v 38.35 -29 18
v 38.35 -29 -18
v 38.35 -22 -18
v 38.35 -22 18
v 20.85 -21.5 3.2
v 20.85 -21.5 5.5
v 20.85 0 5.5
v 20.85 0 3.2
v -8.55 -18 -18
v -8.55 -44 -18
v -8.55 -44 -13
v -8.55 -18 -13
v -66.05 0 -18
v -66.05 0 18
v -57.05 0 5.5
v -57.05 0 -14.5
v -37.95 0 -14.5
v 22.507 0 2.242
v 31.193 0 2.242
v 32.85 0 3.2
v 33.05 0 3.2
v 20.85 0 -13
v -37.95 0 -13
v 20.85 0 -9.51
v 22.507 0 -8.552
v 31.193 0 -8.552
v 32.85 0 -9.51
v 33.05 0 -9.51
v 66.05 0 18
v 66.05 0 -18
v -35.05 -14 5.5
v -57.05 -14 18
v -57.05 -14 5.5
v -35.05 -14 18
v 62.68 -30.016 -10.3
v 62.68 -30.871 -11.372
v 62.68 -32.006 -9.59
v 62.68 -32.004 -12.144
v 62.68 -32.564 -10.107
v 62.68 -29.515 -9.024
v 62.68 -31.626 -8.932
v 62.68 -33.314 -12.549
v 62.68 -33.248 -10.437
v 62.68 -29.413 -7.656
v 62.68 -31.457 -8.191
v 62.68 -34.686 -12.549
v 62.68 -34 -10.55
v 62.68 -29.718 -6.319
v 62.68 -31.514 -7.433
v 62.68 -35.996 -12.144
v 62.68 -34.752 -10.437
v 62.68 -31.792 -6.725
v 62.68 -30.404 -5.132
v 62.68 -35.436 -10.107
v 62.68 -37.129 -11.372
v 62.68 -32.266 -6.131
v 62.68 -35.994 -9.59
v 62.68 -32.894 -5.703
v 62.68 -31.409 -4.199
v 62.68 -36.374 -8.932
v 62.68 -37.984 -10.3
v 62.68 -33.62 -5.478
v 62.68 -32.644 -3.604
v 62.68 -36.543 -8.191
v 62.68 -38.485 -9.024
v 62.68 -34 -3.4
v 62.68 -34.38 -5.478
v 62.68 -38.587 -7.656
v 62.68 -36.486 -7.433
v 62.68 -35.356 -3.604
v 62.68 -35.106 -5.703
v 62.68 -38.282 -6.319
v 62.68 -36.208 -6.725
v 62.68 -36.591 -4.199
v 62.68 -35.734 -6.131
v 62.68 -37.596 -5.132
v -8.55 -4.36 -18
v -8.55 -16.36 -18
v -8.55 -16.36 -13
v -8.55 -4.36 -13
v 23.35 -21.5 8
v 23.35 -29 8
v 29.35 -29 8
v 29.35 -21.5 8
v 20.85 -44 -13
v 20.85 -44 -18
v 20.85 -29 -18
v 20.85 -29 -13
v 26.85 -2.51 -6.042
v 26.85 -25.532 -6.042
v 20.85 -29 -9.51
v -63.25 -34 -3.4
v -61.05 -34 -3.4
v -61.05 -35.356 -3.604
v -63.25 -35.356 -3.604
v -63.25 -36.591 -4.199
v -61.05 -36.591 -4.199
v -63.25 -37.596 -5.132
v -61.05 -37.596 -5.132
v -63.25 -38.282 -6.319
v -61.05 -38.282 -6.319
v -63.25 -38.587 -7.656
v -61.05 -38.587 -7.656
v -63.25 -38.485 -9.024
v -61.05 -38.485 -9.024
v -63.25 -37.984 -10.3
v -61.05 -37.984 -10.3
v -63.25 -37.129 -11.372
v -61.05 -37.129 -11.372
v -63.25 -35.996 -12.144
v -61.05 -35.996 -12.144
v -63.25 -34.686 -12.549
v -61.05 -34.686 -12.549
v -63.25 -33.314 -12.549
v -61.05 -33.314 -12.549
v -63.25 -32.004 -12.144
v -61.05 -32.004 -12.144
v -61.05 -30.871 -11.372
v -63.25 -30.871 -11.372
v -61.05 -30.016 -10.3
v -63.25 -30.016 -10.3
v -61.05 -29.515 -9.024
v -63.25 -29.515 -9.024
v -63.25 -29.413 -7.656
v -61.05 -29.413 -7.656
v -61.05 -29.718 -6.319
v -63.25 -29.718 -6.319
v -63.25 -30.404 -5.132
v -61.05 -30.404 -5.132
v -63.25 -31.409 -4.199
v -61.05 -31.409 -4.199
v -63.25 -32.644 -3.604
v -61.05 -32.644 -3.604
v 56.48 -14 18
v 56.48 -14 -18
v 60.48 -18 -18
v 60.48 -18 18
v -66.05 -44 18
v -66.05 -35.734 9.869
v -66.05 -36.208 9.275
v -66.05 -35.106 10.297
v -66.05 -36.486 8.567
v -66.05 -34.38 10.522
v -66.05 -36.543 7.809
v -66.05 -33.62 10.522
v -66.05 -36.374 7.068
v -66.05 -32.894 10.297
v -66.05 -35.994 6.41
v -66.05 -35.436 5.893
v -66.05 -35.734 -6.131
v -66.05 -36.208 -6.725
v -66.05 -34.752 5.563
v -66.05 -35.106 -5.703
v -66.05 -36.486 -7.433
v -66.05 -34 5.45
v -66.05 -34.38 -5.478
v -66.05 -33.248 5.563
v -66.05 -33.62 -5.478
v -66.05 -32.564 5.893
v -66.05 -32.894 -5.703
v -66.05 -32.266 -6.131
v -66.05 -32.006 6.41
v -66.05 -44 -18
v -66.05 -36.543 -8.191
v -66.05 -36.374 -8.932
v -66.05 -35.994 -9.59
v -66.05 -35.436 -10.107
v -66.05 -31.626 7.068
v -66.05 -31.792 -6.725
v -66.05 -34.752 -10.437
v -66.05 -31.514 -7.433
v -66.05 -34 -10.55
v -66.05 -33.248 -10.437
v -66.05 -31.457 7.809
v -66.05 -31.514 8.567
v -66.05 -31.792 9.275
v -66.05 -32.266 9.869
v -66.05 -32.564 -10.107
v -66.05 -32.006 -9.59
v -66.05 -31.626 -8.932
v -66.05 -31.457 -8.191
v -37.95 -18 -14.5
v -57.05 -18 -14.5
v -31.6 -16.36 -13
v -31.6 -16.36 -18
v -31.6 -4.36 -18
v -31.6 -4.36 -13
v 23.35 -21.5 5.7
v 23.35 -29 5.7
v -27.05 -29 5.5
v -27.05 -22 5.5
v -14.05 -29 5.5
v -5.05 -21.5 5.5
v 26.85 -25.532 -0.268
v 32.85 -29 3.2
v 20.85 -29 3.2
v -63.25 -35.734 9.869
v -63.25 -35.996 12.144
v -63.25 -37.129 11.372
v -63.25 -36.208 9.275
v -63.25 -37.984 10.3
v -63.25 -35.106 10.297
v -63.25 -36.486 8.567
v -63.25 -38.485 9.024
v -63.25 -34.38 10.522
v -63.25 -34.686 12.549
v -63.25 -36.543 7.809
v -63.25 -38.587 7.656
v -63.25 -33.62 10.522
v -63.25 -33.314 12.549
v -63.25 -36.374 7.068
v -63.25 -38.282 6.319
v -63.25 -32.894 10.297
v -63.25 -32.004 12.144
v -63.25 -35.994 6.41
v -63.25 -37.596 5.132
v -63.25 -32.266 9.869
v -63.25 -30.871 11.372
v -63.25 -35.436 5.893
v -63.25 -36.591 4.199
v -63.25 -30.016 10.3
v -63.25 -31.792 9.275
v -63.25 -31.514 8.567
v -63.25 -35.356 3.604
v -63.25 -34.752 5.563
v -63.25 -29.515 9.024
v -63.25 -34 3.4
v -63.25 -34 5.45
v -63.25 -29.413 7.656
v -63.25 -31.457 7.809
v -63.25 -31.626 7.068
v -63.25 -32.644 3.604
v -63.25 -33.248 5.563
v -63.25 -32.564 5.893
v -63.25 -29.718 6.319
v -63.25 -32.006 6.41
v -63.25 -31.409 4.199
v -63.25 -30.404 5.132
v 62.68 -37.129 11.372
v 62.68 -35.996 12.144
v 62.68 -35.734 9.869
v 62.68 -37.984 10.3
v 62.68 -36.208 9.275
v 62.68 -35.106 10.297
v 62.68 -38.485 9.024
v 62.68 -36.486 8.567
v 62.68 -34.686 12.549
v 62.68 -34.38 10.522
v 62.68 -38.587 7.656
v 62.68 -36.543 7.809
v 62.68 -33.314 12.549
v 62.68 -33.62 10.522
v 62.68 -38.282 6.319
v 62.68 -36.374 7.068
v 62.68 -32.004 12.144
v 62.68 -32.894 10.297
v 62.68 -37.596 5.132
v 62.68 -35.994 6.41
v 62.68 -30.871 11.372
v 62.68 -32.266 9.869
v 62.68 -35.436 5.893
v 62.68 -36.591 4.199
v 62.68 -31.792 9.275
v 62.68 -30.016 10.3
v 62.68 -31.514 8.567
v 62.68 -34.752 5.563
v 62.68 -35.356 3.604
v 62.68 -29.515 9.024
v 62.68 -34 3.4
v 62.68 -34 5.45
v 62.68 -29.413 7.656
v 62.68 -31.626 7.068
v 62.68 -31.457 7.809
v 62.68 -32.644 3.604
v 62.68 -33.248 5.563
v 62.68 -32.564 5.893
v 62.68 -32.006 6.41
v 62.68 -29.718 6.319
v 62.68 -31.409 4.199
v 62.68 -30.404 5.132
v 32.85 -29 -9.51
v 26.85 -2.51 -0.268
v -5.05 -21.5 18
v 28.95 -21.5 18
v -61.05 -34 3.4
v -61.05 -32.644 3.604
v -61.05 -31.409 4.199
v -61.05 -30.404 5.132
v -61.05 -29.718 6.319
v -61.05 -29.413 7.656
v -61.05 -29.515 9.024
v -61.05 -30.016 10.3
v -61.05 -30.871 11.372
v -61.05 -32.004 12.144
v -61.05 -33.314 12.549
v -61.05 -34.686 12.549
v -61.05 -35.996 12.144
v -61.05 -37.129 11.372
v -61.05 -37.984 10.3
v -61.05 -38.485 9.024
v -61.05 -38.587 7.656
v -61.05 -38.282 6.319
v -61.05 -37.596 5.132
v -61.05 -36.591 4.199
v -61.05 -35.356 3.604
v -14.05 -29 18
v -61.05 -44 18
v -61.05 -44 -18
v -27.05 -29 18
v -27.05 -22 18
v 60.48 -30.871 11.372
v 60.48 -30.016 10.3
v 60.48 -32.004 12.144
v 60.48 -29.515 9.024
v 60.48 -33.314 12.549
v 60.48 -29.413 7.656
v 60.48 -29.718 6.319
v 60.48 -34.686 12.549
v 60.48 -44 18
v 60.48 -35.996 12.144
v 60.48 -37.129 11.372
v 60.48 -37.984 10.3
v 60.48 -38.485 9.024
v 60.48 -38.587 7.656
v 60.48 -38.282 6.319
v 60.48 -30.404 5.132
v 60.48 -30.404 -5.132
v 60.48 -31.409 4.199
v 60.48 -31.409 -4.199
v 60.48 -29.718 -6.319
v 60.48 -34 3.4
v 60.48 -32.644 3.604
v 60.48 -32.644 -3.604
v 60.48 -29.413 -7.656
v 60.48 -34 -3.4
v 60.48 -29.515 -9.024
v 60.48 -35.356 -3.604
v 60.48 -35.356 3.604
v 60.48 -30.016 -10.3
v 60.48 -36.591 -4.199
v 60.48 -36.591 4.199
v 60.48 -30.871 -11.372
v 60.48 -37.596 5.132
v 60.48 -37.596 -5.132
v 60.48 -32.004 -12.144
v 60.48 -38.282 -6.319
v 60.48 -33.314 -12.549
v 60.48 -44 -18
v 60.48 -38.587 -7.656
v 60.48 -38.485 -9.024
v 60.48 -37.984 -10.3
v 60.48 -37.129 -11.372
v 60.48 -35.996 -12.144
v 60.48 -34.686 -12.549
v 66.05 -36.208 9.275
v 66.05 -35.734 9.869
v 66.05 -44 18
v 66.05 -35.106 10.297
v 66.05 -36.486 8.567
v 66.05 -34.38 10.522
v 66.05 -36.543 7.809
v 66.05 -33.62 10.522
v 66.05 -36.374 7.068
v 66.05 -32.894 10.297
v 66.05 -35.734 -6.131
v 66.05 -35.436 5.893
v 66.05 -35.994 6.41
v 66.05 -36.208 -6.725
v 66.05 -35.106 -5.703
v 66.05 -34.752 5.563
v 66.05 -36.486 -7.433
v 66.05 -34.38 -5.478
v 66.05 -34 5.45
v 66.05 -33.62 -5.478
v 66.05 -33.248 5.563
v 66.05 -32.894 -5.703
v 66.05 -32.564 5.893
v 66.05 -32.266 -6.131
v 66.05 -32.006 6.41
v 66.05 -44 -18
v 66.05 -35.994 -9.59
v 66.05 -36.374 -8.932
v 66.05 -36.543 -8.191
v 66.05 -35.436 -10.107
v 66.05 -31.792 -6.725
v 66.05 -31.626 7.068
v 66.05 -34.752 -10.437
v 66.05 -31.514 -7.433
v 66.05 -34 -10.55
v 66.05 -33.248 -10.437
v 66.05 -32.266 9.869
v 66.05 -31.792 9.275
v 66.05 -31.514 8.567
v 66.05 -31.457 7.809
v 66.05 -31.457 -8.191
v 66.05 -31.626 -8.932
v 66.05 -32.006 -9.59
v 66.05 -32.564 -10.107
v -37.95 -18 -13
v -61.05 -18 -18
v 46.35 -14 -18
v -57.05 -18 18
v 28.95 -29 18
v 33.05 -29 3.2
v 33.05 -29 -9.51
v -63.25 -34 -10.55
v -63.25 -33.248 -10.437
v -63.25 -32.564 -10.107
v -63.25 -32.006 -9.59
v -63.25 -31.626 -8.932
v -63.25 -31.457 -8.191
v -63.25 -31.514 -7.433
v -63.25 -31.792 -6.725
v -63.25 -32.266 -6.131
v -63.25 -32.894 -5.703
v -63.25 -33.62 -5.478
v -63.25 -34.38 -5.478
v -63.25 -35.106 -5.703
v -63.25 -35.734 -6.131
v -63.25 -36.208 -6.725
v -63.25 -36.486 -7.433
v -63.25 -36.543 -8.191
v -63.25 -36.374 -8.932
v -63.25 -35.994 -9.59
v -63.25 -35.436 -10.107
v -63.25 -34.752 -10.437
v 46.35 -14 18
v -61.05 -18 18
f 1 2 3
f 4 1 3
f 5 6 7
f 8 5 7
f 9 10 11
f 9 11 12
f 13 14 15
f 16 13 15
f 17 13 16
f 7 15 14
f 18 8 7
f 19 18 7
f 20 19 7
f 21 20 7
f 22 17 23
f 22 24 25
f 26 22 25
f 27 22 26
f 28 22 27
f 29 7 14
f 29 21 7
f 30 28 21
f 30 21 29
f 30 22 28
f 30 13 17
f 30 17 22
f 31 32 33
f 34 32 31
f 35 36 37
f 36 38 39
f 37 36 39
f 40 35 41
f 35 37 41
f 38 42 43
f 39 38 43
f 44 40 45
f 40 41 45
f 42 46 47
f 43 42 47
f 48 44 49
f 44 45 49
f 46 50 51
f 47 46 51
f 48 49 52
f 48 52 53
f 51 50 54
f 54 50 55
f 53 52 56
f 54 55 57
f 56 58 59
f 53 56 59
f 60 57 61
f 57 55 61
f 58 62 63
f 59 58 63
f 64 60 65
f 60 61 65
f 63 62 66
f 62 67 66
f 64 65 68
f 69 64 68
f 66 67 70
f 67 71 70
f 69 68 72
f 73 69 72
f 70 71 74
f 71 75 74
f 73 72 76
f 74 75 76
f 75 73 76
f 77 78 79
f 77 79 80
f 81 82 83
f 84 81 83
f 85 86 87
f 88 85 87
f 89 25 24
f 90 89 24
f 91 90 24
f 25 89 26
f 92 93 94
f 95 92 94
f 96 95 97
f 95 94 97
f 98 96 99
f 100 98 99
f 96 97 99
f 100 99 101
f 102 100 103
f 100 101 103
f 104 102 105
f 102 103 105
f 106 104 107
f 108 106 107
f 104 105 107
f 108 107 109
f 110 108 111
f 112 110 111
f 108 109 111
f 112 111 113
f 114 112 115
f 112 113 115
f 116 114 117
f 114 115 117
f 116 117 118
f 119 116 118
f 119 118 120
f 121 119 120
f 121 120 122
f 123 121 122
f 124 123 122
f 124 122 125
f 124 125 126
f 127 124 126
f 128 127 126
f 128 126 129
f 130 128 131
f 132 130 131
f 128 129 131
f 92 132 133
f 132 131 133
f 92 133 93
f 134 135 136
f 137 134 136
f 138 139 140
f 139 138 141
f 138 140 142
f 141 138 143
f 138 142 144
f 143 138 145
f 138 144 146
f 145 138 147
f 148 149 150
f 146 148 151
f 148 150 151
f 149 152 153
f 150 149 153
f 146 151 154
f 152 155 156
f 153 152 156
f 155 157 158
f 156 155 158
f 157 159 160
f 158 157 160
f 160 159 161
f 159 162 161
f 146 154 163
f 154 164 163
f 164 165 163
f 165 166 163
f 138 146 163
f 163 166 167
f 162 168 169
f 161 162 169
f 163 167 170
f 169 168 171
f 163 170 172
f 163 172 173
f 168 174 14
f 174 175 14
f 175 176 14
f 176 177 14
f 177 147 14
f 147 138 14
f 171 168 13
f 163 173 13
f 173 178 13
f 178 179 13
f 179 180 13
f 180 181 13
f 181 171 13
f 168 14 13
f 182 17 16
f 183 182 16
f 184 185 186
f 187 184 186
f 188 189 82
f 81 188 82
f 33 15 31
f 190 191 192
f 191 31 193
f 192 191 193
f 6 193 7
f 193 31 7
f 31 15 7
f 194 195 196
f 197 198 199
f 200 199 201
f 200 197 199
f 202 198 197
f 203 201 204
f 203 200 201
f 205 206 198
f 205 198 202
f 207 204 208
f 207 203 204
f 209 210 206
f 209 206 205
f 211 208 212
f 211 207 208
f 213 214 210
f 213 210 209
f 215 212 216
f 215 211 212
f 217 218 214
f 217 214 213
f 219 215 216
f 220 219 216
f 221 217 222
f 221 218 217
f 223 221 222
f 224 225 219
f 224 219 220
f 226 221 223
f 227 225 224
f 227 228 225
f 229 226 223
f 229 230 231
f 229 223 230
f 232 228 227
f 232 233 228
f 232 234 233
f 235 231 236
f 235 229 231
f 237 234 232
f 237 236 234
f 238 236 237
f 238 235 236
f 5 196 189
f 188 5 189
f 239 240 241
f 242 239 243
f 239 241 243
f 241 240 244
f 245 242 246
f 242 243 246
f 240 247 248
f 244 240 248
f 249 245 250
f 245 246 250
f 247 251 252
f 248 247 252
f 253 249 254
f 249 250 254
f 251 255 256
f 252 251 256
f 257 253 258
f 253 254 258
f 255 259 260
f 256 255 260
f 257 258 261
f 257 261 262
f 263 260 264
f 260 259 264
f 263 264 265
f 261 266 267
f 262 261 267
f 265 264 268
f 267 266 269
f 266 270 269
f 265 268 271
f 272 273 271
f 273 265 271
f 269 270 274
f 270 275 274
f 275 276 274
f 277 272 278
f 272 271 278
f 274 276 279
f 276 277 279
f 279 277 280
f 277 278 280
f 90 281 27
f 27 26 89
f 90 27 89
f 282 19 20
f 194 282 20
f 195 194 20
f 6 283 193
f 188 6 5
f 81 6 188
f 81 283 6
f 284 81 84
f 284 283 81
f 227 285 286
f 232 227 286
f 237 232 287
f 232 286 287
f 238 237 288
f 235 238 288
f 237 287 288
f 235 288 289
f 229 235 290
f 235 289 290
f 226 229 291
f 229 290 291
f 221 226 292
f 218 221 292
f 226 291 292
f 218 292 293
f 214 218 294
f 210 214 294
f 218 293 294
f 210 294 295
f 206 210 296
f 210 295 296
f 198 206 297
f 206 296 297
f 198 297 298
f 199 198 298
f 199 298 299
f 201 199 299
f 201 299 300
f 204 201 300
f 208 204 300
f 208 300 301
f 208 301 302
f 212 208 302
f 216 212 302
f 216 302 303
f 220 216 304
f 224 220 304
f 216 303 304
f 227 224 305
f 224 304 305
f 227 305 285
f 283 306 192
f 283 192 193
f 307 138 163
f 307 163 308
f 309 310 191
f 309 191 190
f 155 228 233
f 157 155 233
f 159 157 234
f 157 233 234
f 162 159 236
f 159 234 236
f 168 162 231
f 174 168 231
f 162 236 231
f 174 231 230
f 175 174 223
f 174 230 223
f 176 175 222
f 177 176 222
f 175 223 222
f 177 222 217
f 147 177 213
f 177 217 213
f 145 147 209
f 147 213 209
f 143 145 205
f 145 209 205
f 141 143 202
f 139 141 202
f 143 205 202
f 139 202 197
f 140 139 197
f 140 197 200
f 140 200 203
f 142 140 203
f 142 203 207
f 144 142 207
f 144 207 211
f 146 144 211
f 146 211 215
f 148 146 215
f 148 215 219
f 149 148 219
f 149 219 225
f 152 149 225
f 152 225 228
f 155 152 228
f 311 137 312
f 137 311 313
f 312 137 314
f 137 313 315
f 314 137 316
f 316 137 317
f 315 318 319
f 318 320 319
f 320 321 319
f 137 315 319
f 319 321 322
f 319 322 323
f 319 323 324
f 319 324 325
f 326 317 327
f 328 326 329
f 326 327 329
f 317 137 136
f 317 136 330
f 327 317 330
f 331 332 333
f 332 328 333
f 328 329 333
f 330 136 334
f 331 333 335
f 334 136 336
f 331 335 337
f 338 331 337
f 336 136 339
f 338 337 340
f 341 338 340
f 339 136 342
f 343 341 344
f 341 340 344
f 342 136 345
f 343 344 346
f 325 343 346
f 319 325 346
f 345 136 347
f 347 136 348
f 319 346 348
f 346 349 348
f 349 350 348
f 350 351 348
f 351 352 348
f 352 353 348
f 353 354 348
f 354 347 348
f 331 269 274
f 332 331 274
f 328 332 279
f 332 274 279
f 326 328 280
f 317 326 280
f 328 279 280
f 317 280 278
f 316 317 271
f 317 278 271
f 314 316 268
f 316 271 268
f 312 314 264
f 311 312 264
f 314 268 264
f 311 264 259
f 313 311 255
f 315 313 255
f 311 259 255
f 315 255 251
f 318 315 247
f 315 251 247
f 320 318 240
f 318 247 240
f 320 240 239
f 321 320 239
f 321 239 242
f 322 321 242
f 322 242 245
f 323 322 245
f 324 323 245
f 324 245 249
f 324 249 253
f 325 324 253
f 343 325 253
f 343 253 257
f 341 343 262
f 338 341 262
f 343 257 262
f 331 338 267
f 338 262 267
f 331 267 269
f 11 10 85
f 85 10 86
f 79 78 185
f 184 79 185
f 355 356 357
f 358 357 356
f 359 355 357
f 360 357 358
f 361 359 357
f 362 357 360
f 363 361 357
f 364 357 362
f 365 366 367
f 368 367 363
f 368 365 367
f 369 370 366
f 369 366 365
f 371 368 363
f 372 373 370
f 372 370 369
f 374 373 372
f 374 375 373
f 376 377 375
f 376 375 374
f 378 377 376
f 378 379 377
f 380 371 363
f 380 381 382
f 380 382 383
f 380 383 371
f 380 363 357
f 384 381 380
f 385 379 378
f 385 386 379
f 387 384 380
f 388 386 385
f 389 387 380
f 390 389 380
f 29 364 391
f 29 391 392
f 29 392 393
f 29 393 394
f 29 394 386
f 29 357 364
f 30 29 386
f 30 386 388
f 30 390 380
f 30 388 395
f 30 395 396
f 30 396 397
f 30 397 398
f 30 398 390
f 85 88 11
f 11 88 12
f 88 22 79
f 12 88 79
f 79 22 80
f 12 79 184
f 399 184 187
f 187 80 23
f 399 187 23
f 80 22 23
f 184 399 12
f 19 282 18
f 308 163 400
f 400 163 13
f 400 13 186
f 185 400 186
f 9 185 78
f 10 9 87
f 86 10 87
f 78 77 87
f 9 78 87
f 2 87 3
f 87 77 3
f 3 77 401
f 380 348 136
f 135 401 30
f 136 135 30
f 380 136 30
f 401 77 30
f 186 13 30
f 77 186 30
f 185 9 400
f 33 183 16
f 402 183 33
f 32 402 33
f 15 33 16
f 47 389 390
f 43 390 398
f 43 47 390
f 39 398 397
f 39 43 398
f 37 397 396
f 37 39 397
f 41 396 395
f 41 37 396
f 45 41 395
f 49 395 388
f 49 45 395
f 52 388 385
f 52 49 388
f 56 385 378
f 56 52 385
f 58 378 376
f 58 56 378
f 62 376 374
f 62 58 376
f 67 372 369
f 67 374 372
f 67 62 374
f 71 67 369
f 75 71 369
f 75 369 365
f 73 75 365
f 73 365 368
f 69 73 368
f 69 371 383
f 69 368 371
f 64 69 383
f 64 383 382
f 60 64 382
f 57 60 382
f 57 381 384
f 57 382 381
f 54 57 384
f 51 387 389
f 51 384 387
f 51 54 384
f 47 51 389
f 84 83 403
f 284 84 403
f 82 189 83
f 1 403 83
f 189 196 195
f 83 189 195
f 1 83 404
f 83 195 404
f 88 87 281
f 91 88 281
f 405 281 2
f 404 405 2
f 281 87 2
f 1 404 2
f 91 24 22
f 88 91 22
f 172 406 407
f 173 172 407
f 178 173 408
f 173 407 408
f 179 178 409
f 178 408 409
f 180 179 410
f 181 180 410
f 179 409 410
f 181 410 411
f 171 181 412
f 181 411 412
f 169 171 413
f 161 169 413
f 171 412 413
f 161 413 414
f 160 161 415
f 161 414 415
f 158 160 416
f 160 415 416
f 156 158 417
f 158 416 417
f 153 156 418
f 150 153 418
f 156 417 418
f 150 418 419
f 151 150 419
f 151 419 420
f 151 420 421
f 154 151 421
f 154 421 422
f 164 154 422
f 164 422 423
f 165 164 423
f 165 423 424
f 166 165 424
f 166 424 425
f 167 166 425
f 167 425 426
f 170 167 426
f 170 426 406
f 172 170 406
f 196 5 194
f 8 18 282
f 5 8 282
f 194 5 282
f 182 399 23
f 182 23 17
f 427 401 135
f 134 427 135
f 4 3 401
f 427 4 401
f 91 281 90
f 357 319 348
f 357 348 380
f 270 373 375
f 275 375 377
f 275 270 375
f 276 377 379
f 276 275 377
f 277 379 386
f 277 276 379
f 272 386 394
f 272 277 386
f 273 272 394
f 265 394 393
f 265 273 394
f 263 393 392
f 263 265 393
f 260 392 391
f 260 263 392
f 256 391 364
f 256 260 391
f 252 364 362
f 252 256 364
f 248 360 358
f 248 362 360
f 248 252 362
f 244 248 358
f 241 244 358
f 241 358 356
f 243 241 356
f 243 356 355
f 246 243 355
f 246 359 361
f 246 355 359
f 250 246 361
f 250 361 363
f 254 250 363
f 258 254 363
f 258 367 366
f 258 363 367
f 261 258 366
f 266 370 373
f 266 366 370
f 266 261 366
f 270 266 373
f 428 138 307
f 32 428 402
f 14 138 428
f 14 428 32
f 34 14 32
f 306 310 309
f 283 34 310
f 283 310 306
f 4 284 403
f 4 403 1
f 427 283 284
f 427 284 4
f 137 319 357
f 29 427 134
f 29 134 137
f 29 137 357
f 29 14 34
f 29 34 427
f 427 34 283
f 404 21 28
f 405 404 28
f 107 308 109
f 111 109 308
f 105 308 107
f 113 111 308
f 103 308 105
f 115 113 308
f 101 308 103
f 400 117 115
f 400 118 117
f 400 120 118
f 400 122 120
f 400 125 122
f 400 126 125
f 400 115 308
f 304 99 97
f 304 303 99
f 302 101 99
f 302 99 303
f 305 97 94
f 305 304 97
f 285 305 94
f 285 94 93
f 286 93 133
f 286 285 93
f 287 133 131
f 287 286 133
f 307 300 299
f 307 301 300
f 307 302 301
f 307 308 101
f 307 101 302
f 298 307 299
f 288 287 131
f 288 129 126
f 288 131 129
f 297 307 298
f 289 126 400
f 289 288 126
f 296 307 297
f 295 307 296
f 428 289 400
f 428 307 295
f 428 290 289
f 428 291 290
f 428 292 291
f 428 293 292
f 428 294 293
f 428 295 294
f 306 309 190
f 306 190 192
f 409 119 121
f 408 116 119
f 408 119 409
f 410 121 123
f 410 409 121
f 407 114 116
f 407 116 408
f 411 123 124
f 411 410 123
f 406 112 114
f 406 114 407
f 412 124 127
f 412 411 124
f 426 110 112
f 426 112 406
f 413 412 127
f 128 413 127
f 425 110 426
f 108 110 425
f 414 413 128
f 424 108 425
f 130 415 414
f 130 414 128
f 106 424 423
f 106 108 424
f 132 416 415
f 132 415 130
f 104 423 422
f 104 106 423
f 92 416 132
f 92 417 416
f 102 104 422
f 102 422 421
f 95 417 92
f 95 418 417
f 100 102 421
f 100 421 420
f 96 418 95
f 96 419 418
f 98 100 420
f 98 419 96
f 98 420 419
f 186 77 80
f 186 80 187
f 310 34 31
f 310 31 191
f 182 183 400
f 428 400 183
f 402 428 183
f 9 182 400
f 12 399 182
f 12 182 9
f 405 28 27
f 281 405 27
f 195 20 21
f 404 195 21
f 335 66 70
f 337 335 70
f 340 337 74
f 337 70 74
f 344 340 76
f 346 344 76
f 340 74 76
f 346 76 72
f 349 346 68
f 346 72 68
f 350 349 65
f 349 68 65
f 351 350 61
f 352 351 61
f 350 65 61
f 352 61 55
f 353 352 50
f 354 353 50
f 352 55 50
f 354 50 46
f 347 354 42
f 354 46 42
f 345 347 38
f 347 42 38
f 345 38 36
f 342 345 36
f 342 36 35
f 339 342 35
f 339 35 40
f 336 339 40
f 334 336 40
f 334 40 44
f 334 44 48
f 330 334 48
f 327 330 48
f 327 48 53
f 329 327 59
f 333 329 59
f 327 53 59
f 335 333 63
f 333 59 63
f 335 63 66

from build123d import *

# Parameters (mm, degrees)
SKETCH1_W                      = 132.1
SKETCH1_H                      = 36
BOSS_EXTRUDE1_DEPTH            = 44
CUT_EXTRUDE1_REACH             = 89.147
CUT_EXTRUDE2_REACH             = 89.147
SKETCH3_4_W                    = 23.05
SKETCH3_4_H                    = 12
SKETCH3_4_W_2                  = 52.5
SKETCH3_4_H_2                  = 26
CUT_EXTRUDE3_DEPTH             = 12.5
CUT_EXTRUDE6_DEPTH             = 7.5
CUT_EXTRUDE7_REACH             = 101.054
CUT_EXTRUDE8_REACH             = 137.7
SKETCH11_R                     = 2.55
CUT_EXTRUDE8_DIRECTION_2_REACH = 137.7
SKETCH11_6_R                   = 4.6
SKETCH11_6_R_2                 = 2.55
CUT_EXTRUDE10_DEPTH            = 2.2
CUT_EXTRUDE11_START            = 123.73
SKETCH11_7_R                   = 4.6
SKETCH11_7_R_2                 = 2.55
CUT_EXTRUDE11_DEPTH            = 2.2


with BuildPart() as part:
    # Sketch1 → Boss-Extrude1 (new body)
    with BuildSketch(Plane(origin=(0, 0, 0), x_dir=(1, 0, 0), z_dir=(0, 1, 0))):
        Rectangle(SKETCH1_W, SKETCH1_H)
        Polygon((-57.05, 14.5), (-57.05, -5.5), (20.85, -5.5), (20.85, -3.2), (26.85, 0.267693758), (32.85, -3.2), (33.05, -3.2), (33.05, 9.51), (32.85, 9.51), (26.85, 6.042306242), (20.85, 9.51), (20.85, 13), (-37.95, 13), (-37.95, 14.5), align=None, mode=Mode.SUBTRACT)
    extrude(amount=-BOSS_EXTRUDE1_DEPTH)

    # Cut-Extrude1: up to this face of the body (flat: up to its plane)
    cut_extrude1_end = Plane(part.part.faces().sort_by_distance((0, -22, 18))[0])
    # Sketch3 → Cut-Extrude1 (cut, up to the picked face)
    with BuildSketch(Plane(origin=(0, 0, -18), x_dir=(-1, 0, 0), z_dir=(0, 0, -1)), mode=Mode.PRIVATE) as cut_extrude1_sk1:
        Polygon((-60.48, -18), (-60.48, -44), (-20.85, -44), (-20.85, -29), (-38.35, -29), (-38.35, -22), (-46.35, -14), (-56.48, -14), align=None)
    cut_extrude1_tool1 = split(extrude(cut_extrude1_sk1.sketch, amount=-CUT_EXTRUDE1_REACH, mode=Mode.PRIVATE), bisect_by=cut_extrude1_end, keep=Keep.BOTH, mode=Mode.PRIVATE)
    add(cut_extrude1_tool1.solids().sort_by(Axis((43.76231, -31.789655, -18), (0, 0, 1)))[0], mode=Mode.SUBTRACT)

    # Cut-Extrude2: up to this face of the body (flat: up to its plane)
    cut_extrude2_end = Plane(part.part.faces().sort_by_distance((-18.1, -22, 5.5))[0])
    # Sketch3<4> → Cut-Extrude2 (cut, up to the picked face)
    with BuildSketch(Plane(origin=(0, 0, -18), x_dir=(-1, 0, 0), z_dir=(0, 0, -1)), mode=Mode.PRIVATE) as cut_extrude2_sk1:
        with Locations((20.075, -10.36)):
            Rectangle(SKETCH3_4_W, SKETCH3_4_H)
    cut_extrude2_tool1 = split(extrude(cut_extrude2_sk1.sketch, amount=-CUT_EXTRUDE2_REACH, mode=Mode.PRIVATE), bisect_by=cut_extrude2_end, keep=Keep.BOTH, mode=Mode.PRIVATE)
    # Sketch3<4> → Cut-Extrude2 (cut, up to the picked face)
    with BuildSketch(Plane(origin=(0, 0, -18), x_dir=(-1, 0, 0), z_dir=(0, 0, -1)), mode=Mode.PRIVATE) as cut_extrude2_sk2:
        with Locations((34.8, -31)):
            Rectangle(SKETCH3_4_W_2, SKETCH3_4_H_2)
    cut_extrude2_tool2 = split(extrude(cut_extrude2_sk2.sketch, amount=-CUT_EXTRUDE2_REACH, mode=Mode.PRIVATE), bisect_by=cut_extrude2_end, keep=Keep.BOTH, mode=Mode.PRIVATE)
    add(cut_extrude2_tool1.solids().sort_by(Axis((-20.075, -10.36, -18), (0, 0, 1)))[0], mode=Mode.SUBTRACT)
    add(cut_extrude2_tool2.solids().sort_by(Axis((-34.8, -31, -18), (0, 0, 1)))[0], mode=Mode.SUBTRACT)

    # Sketch4 → Cut-Extrude3 (cut)
    with BuildSketch(Plane.XY.offset(18)):
        Polygon((-61.05, -44), (-61.05, -18), (-57.05, -18), (-57.05, -14), (-35.05, -14), (-27.05, -22), (-27.05, -29), (-14.05, -29), (-5.05, -21.5), (20.85, -21.5), (20.85, -29), (20.85, -44), align=None)
    extrude(amount=-CUT_EXTRUDE3_DEPTH, mode=Mode.SUBTRACT)

    # Sketch7 → Cut-Extrude6 (cut)
    with BuildSketch(Plane.XZ.offset(29)):
        Polygon((20.85, 3.2), (23.35, 5.7), (23.35, 8), (29.35, 8), (28.95, 18), (20.85, 18), align=None)
    extrude(amount=-CUT_EXTRUDE6_DEPTH, mode=Mode.SUBTRACT)

    # Cut-Extrude7: up to this face of the body (flat: up to its plane)
    cut_extrude7_end = Plane(part.part.faces().sort_by_distance((33.05, -14.5, -3.155))[0])
    # Sketch10 → Cut-Extrude7 (cut, up to the picked face)
    with BuildSketch(Plane.ZY.offset(-20.85), mode=Mode.PRIVATE) as cut_extrude7_sk1:
        Polygon((-8.552306242, 0), (-6.042306242, 0), (-6.042306242, -2.51), align=None)
    cut_extrude7_tool1 = split(extrude(cut_extrude7_sk1.sketch, amount=-CUT_EXTRUDE7_REACH, mode=Mode.PRIVATE), bisect_by=cut_extrude7_end, keep=Keep.BOTH, mode=Mode.PRIVATE)
    # Sketch10 → Cut-Extrude7 (cut, up to the picked face)
    with BuildSketch(Plane.ZY.offset(-20.85), mode=Mode.PRIVATE) as cut_extrude7_sk2:
        Polygon((-0.267693758, 0), (-0.267693758, -2.51), (2.242306242, 0), align=None)
    cut_extrude7_tool2 = split(extrude(cut_extrude7_sk2.sketch, amount=-CUT_EXTRUDE7_REACH, mode=Mode.PRIVATE), bisect_by=cut_extrude7_end, keep=Keep.BOTH, mode=Mode.PRIVATE)
    # Sketch10 → Cut-Extrude7 (cut, up to the picked face)
    with BuildSketch(Plane.ZY.offset(-20.85), mode=Mode.PRIVATE) as cut_extrude7_sk3:
        Polygon((-9.51, -29), (-6.042306242, -25.532306242), (-6.042306242, -29), align=None)
    cut_extrude7_tool3 = split(extrude(cut_extrude7_sk3.sketch, amount=-CUT_EXTRUDE7_REACH, mode=Mode.PRIVATE), bisect_by=cut_extrude7_end, keep=Keep.BOTH, mode=Mode.PRIVATE)
    # Sketch10 → Cut-Extrude7 (cut, up to the picked face)
    with BuildSketch(Plane.ZY.offset(-20.85), mode=Mode.PRIVATE) as cut_extrude7_sk4:
        Polygon((-0.267693758, -25.532306242), (-0.267693758, -29), (3.2, -29), align=None)
    cut_extrude7_tool4 = split(extrude(cut_extrude7_sk4.sketch, amount=-CUT_EXTRUDE7_REACH, mode=Mode.PRIVATE), bisect_by=cut_extrude7_end, keep=Keep.BOTH, mode=Mode.PRIVATE)
    add(cut_extrude7_tool1.solids().sort_by(Axis((20.85, -0.836667, -6.878973), (1, 0, 0)))[0], mode=Mode.SUBTRACT)
    add(cut_extrude7_tool2.solids().sort_by(Axis((20.85, -0.836667, 0.568973), (1, 0, 0)))[0], mode=Mode.SUBTRACT)
    add(cut_extrude7_tool3.solids().sort_by(Axis((20.85, -27.844102, -7.198204), (1, 0, 0)))[0], mode=Mode.SUBTRACT)
    add(cut_extrude7_tool4.solids().sort_by(Axis((20.85, -27.844102, 0.888204), (1, 0, 0)))[0], mode=Mode.SUBTRACT)

    # Cut-Extrude8: up to this face of the body (flat: up to its plane)
    cut_extrude8_end = Plane(part.part.faces().sort_by_distance((-66.05, -22, 0))[0])
    # Sketch11 → Cut-Extrude8 (cut, up to the picked face)
    with BuildSketch(Plane(origin=(-61.05, 0, 0), x_dir=(0, 0, -1), z_dir=(1, 0, 0)), mode=Mode.PRIVATE) as cut_extrude8_sk1:
        with Locations((-8, -34)):
            Circle(SKETCH11_R)
    cut_extrude8_tool1 = split(extrude(cut_extrude8_sk1.sketch, amount=-CUT_EXTRUDE8_REACH, mode=Mode.PRIVATE), bisect_by=cut_extrude8_end, keep=Keep.BOTH, mode=Mode.PRIVATE)
    # Sketch11 → Cut-Extrude8 (cut, up to the picked face)
    with BuildSketch(Plane(origin=(-61.05, 0, 0), x_dir=(0, 0, -1), z_dir=(1, 0, 0)), mode=Mode.PRIVATE) as cut_extrude8_sk2:
        with Locations((8, -34)):
            Circle(SKETCH11_R)
    cut_extrude8_tool2 = split(extrude(cut_extrude8_sk2.sketch, amount=-CUT_EXTRUDE8_REACH, mode=Mode.PRIVATE), bisect_by=cut_extrude8_end, keep=Keep.BOTH, mode=Mode.PRIVATE)
    add(cut_extrude8_tool1.solids().sort_by(Axis((-61.05, -34, 8), (-1, 0, 0)))[0], mode=Mode.SUBTRACT)
    add(cut_extrude8_tool2.solids().sort_by(Axis((-61.05, -34, -8), (-1, 0, 0)))[0], mode=Mode.SUBTRACT)

    # Cut-Extrude8 direction 2: up to this face of the body (flat: up to its plane)
    cut_extrude8_direction_2_end = Plane(part.part.faces().sort_by_distance((66.05, -22, 0))[0])
    # Sketch11 → Cut-Extrude8 direction 2 (cut, up to the picked face)
    with BuildSketch(Plane(origin=(-61.05, 0, 0), x_dir=(0, 0, -1), z_dir=(1, 0, 0)), mode=Mode.PRIVATE) as cut_extrude8_direction_2_sk1:
        with Locations((-8, -34)):
            Circle(SKETCH11_R)
    cut_extrude8_direction_2_tool1 = split(extrude(cut_extrude8_direction_2_sk1.sketch, amount=CUT_EXTRUDE8_DIRECTION_2_REACH, mode=Mode.PRIVATE), bisect_by=cut_extrude8_direction_2_end, keep=Keep.BOTH, mode=Mode.PRIVATE)
    # Sketch11 → Cut-Extrude8 direction 2 (cut, up to the picked face)
    with BuildSketch(Plane(origin=(-61.05, 0, 0), x_dir=(0, 0, -1), z_dir=(1, 0, 0)), mode=Mode.PRIVATE) as cut_extrude8_direction_2_sk2:
        with Locations((8, -34)):
            Circle(SKETCH11_R)
    cut_extrude8_direction_2_tool2 = split(extrude(cut_extrude8_direction_2_sk2.sketch, amount=CUT_EXTRUDE8_DIRECTION_2_REACH, mode=Mode.PRIVATE), bisect_by=cut_extrude8_direction_2_end, keep=Keep.BOTH, mode=Mode.PRIVATE)
    add(cut_extrude8_direction_2_tool1.solids().sort_by(Axis((-61.05, -34, 8), (1, 0, 0)))[0], mode=Mode.SUBTRACT)
    add(cut_extrude8_direction_2_tool2.solids().sort_by(Axis((-61.05, -34, -8), (1, 0, 0)))[0], mode=Mode.SUBTRACT)

    # Sketch11<6> → Cut-Extrude10 (cut)
    # profile 1 of 2: a face of its own
    with BuildSketch(Plane(origin=(-61.05, 0, 0), x_dir=(0, 0, -1), z_dir=(1, 0, 0))):
        with Locations((-8, -34)):
            Circle(SKETCH11_6_R)
        with Locations((-8, -34)):
            Circle(SKETCH11_6_R_2, mode=Mode.SUBTRACT)
    # profile 2 of 2: a face of its own
    with BuildSketch(Plane(origin=(-61.05, 0, 0), x_dir=(0, 0, -1), z_dir=(1, 0, 0))):
        with Locations(Location((8, -34, 0), (0, 0, 180))):
            Circle(SKETCH11_6_R)
        with Locations(Location((8, -34, 0), (0, 0, 180))):
            Circle(SKETCH11_6_R_2, mode=Mode.SUBTRACT)
    extrude(amount=-CUT_EXTRUDE10_DEPTH, mode=Mode.SUBTRACT)

    # Sketch11<7> → Cut-Extrude11 (cut)
    # profile 1 of 2: a face of its own
    with BuildSketch(Plane(origin=(-61.05, 0, 0), x_dir=(0, 0, -1), z_dir=(1, 0, 0)).offset(CUT_EXTRUDE11_START)):
        with Locations((-8, -34)):
            Circle(SKETCH11_7_R)
        with Locations((-8, -34)):
            Circle(SKETCH11_7_R_2, mode=Mode.SUBTRACT)
    # profile 2 of 2: a face of its own
    with BuildSketch(Plane(origin=(-61.05, 0, 0), x_dir=(0, 0, -1), z_dir=(1, 0, 0)).offset(CUT_EXTRUDE11_START)):
        with Locations(Location((8, -34, 0), (0, 0, 180))):
            Circle(SKETCH11_7_R)
        with Locations((8, -34)):
            Circle(SKETCH11_7_R_2, mode=Mode.SUBTRACT)
    extrude(amount=-CUT_EXTRUDE11_DEPTH, mode=Mode.SUBTRACT)


solid = part.part
